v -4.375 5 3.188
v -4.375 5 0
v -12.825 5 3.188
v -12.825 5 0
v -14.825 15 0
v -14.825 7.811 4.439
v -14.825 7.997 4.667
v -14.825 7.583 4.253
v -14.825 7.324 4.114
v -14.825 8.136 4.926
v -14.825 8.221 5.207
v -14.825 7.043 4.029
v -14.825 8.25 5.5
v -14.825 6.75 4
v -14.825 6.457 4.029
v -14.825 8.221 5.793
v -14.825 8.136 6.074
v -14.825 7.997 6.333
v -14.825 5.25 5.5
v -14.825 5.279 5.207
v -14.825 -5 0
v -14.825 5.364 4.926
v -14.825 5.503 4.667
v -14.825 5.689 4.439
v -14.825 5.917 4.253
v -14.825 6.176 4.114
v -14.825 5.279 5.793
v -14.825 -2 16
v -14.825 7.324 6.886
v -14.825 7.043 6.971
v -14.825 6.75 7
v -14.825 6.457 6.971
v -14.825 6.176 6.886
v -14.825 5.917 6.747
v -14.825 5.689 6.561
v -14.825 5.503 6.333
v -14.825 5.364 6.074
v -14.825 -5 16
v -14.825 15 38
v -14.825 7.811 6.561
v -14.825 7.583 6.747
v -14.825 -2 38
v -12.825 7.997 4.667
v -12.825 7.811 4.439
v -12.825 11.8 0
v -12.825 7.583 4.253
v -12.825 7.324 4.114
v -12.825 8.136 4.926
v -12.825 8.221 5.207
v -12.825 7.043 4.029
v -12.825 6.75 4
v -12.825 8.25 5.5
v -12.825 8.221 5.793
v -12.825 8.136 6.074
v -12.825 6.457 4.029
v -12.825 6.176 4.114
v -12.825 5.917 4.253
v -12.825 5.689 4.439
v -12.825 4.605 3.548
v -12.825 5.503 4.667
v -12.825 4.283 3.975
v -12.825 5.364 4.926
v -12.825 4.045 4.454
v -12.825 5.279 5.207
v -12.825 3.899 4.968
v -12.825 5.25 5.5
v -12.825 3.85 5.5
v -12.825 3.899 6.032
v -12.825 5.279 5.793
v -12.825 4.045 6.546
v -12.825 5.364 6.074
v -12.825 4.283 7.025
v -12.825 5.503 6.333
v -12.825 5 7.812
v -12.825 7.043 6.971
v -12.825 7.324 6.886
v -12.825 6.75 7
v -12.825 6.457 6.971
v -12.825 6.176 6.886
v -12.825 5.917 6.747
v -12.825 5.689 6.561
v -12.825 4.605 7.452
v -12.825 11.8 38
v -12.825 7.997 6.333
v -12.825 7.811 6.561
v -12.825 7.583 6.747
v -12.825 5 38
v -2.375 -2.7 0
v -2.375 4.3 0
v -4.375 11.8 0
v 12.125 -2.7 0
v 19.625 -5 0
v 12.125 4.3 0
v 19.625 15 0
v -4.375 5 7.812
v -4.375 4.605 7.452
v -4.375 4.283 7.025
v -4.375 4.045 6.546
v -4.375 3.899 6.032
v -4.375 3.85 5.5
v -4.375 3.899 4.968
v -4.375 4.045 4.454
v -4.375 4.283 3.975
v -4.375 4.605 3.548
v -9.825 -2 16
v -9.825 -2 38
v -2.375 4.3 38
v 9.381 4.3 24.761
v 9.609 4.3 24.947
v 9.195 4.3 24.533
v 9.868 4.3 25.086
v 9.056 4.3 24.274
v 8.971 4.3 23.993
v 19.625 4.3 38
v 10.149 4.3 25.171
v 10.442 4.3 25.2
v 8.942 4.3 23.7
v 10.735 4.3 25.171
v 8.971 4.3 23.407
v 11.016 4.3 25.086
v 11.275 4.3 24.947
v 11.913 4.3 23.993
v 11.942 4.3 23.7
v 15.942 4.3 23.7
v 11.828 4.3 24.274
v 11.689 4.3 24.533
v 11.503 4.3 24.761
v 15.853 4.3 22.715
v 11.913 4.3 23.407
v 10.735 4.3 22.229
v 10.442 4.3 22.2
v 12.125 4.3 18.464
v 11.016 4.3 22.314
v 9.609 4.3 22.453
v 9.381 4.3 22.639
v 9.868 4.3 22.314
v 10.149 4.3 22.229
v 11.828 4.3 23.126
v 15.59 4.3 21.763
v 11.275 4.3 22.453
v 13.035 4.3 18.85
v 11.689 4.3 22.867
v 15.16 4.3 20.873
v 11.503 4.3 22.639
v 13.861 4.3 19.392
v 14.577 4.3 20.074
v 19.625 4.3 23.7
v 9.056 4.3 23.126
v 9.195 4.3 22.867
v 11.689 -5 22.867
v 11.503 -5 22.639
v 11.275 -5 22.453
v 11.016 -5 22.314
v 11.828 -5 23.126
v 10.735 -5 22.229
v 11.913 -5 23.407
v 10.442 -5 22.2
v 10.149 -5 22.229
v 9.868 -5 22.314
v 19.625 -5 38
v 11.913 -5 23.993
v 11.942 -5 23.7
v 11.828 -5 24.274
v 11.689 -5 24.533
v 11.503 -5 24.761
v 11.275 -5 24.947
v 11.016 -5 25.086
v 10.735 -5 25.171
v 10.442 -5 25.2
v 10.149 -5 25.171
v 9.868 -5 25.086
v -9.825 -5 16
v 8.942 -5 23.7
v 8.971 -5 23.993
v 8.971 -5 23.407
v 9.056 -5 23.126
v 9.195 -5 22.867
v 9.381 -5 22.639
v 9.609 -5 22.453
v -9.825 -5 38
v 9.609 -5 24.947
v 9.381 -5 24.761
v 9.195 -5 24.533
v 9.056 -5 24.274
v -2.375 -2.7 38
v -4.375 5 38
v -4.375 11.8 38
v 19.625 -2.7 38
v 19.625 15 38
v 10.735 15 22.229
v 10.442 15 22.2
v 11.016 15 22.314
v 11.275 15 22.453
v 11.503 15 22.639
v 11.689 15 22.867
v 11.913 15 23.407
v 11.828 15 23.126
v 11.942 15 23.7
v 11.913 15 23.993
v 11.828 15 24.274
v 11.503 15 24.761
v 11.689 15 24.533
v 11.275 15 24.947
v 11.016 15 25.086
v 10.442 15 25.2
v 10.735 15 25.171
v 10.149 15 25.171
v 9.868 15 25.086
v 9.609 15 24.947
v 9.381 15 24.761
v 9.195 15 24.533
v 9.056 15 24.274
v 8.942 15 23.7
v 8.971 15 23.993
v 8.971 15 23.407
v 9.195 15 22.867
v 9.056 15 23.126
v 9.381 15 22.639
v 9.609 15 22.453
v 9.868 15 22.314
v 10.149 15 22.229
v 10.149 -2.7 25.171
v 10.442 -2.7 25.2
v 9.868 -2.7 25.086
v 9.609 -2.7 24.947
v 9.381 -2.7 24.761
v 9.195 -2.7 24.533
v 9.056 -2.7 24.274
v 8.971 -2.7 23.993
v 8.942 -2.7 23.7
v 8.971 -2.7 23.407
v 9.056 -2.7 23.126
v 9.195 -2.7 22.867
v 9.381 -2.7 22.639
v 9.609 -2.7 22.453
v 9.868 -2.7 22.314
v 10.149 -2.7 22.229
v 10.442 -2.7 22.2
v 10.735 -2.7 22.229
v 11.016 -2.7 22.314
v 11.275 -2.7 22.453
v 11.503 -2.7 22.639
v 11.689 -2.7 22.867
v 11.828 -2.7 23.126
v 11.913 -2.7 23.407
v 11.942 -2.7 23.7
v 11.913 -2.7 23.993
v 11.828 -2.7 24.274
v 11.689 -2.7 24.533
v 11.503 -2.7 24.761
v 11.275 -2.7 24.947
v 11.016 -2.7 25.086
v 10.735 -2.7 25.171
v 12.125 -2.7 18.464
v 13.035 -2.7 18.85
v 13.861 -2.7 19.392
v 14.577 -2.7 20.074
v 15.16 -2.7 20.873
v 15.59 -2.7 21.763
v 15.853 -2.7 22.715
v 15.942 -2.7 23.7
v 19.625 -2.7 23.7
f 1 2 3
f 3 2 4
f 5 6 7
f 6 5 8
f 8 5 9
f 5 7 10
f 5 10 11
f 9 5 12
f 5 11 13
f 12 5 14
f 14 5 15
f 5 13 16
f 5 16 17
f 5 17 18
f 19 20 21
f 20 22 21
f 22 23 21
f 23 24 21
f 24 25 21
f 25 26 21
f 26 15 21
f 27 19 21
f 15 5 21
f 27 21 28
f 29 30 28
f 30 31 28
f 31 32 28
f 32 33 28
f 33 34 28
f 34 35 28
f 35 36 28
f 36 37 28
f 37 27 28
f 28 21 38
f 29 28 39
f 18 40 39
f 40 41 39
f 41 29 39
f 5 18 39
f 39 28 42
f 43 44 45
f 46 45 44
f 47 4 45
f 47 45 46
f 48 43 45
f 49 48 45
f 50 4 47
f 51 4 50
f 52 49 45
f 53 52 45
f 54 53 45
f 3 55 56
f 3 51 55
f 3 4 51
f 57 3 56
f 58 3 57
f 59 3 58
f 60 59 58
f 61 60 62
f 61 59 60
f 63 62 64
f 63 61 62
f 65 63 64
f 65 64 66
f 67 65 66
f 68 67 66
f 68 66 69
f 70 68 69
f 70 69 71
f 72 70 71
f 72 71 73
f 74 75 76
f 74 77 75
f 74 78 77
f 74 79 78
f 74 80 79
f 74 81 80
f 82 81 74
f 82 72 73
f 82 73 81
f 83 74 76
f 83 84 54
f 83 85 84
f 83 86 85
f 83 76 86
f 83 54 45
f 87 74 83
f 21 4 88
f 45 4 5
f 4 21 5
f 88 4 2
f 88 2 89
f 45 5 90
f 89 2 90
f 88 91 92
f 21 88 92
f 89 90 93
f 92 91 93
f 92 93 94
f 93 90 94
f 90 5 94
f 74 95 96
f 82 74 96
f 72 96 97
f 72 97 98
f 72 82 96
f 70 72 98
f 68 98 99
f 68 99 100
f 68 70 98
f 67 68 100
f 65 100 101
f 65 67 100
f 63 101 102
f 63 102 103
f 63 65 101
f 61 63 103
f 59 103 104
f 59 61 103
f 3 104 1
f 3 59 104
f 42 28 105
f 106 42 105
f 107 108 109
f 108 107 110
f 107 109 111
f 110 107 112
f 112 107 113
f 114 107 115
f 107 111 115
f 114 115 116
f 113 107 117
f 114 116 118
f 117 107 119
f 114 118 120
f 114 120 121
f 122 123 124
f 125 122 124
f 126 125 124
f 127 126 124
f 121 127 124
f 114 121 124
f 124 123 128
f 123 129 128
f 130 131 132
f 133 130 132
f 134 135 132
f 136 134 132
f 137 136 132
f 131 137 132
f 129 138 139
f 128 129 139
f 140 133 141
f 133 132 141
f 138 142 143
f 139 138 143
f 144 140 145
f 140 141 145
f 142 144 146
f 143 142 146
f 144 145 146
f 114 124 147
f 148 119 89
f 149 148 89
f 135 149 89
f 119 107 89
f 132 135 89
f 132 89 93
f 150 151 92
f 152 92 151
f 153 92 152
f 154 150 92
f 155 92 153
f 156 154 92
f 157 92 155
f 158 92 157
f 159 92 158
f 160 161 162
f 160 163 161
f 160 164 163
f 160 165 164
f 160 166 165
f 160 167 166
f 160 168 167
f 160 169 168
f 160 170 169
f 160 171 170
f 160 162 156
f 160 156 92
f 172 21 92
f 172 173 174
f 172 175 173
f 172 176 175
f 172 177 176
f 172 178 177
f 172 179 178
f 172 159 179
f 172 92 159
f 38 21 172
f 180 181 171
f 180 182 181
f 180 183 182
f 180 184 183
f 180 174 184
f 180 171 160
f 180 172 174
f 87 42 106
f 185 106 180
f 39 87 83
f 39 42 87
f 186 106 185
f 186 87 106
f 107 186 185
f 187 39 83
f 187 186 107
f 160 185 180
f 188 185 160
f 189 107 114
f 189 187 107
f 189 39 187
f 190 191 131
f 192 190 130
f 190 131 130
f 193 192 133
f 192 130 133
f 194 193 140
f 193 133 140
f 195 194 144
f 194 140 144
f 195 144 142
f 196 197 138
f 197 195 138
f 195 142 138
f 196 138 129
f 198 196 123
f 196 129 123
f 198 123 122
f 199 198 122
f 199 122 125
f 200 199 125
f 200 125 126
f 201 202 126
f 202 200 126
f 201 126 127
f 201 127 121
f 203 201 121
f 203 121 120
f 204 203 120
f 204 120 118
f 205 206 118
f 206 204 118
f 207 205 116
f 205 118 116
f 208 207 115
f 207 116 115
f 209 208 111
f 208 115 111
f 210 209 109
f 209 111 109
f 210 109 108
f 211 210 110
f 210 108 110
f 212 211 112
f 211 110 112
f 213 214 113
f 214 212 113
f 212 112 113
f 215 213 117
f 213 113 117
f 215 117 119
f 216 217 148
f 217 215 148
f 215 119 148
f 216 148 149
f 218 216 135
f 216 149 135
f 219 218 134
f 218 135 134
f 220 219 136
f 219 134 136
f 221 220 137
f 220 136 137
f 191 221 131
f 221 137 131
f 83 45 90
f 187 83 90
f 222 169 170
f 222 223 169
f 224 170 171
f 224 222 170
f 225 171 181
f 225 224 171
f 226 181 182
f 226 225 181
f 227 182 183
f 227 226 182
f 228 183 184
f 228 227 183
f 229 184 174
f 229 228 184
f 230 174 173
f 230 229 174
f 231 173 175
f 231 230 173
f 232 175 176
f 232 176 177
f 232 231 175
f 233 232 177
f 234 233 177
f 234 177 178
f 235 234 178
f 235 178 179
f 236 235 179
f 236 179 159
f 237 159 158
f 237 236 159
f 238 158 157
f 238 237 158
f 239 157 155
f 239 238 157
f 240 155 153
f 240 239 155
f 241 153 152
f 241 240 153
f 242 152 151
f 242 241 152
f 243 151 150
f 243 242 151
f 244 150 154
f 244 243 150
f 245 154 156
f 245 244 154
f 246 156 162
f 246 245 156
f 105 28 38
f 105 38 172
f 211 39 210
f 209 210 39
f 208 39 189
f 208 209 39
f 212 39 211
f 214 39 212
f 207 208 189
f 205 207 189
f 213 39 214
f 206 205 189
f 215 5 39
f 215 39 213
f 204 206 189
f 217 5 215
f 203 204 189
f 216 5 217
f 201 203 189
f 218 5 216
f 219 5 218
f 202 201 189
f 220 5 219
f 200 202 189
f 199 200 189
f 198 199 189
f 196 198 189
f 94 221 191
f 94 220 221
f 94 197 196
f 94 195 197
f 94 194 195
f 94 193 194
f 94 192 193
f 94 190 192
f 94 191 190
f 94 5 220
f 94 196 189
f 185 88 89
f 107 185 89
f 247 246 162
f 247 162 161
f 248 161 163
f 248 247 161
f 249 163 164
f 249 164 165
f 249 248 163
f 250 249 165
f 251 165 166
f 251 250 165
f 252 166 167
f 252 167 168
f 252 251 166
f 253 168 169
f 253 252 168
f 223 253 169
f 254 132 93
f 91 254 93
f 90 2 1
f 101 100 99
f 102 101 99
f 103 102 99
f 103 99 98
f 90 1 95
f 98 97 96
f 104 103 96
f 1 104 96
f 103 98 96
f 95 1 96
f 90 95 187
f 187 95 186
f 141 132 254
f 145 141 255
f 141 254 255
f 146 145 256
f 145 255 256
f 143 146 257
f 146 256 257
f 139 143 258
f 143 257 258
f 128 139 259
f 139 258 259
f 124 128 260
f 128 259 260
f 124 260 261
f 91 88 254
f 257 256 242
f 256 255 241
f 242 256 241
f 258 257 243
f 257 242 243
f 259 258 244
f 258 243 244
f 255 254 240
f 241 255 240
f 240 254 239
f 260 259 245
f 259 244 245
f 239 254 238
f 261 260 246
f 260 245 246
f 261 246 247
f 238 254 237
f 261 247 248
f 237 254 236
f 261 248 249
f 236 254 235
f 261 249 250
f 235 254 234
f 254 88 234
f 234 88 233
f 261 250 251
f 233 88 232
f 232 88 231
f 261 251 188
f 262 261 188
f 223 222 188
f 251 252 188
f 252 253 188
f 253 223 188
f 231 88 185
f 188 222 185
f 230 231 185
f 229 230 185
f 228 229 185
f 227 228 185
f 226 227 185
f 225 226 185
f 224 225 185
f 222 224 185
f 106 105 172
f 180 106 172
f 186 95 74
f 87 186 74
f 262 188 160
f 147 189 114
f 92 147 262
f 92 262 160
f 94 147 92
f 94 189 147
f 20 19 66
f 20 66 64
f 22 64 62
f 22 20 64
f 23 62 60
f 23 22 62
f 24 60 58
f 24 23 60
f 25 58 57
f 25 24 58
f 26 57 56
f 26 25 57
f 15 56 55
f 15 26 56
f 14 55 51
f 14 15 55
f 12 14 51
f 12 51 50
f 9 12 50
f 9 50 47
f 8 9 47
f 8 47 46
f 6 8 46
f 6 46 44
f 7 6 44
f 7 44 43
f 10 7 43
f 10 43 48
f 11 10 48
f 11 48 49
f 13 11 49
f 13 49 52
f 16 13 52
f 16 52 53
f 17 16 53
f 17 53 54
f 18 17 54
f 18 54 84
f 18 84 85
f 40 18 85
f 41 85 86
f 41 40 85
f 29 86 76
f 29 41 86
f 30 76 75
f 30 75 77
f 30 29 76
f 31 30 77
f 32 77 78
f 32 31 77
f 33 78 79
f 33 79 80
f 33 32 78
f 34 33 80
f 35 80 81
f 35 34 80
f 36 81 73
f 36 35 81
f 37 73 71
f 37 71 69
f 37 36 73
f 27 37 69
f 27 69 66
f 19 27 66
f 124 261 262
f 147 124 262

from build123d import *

# Parameters (mm, degrees)
SKETCH1_W                      = 19
SKETCH1_H                      = 10.7
BOSS_EXTRUDE1_DEPTH            = 38
SKETCH1_H_2                    = 2.3
BOSS_EXTRUDE1_2_DEPTH          = 38
SKETCH1_6_W                    = 12.45
SKETCH1_6_H                    = 3.2
BOSS_EXTRUDE6_DEPTH            = 38
BOSS_EXTRUDE7_DEPTH            = 16
SKETCH4_W                      = 38
SKETCH4_H                      = 2.3
SKETCH4_H_2                    = 10.7
BOSS_EXTRUDE8_DEPTH            = 3
CUT_EXTRUDE1_REACH             = 48.286
SKETCH6_R                      = 1.5
CUT_EXTRUDE1_DIRECTION_2_REACH = 48.286
BOSS_EXTRUDE10_REACH           = 45.922
SKETCH7_W                      = 2
SKETCH7_H                      = 38
BOSS_EXTRUDE11_REACH           = 46.087
SKETCH8_W                      = 7.5
SKETCH8_H                      = 38
CUT_EXTRUDE2_REACH             = 55.44
SKETCH9_R                      = 1.5
CUT_EXTRUDE3_START             = -2
SKETCH9_3_R                    = 2.9
SKETCH9_3_R_2                  = 1.5
CUT_EXTRUDE3_DEPTH             = 8.45
SKETCH6_3_R                    = 5.5
SKETCH6_3_R_2                  = 1.5
SKETCH6_3_W                    = 9.18298076
SKETCH6_3_H                    = 14.3
CUT_EXTRUDE4_DEPTH             = 7


with BuildPart() as part:
    # Sketch1 → Boss-Extrude1 (new body)
    with BuildSketch(Plane.XY):
        with Locations((7.125, 9.65)):
            Rectangle(SKETCH1_W, SKETCH1_H)
    extrude(amount=-BOSS_EXTRUDE1_DEPTH)



with BuildPart() as body_2:
    # Sketch1 → Boss-Extrude1 2 (new body)
    with BuildSketch(Plane.XY):
        with Locations((7.125, -3.85)):
            Rectangle(SKETCH1_W, SKETCH1_H_2)
    extrude(amount=-BOSS_EXTRUDE1_2_DEPTH)


with BuildPart() as part_1:
    add(part.part)

    add(body_2.part)  # Boss-Extrude6 merges body 2
    # Sketch1<6> → Boss-Extrude6 (add)
    with BuildSketch(Plane.XY):
        Polygon((-14.825, 5), (-14.825, -2), (-9.825, -2), (-9.825, -5), (-2.375, -5), (-2.375, 5), align=None)
        with Locations((-8.6, 13.4)):
            Rectangle(SKETCH1_6_W, SKETCH1_6_H)
    extrude(amount=-BOSS_EXTRUDE6_DEPTH)

    # Sketch1<7> → Boss-Extrude7 (add)
    with BuildSketch(Plane.XY):
        Polygon((-14.825, -2), (-14.825, -3.3), (-14.825, -5), (-9.825, -5), (-9.825, -2), align=None)
    extrude(amount=-BOSS_EXTRUDE7_DEPTH)

    # Sketch4 → Boss-Extrude8 (add)
    with BuildSketch(Plane(origin=(16.625, 0, 0), x_dir=(0, 0, -1), z_dir=(1, 0, 0))):
        with Locations((19, -3.85)):
            Rectangle(SKETCH4_W, SKETCH4_H)
        with Locations((19, 9.65)):
            Rectangle(SKETCH4_W, SKETCH4_H_2)
    extrude(amount=BOSS_EXTRUDE8_DEPTH)

    # Sketch6 → Cut-Extrude1 (cut, up to next)
    with BuildSketch(Plane(origin=(0, -2.7, 0), x_dir=(1, 0, 0), z_dir=(0, 1, 0)), mode=Mode.PRIVATE) as cut_extrude1_sk1:
        with Locations(Location((10.44201924, 23.7, 0), (0, 0, 270))):
            Circle(SKETCH6_R)
    cut_extrude1_tool1 = extrude(cut_extrude1_sk1.sketch, amount=-CUT_EXTRUDE1_REACH, mode=Mode.PRIVATE) & part_1.part
    # Sketch6 → Cut-Extrude1 (cut, up to next)
    with BuildSketch(Plane(origin=(0, -2.7, 0), x_dir=(1, 0, 0), z_dir=(0, 1, 0)), mode=Mode.PRIVATE) as cut_extrude1_sk2:
        with BuildLine():
            Line((10.44201924, 25.2), (10.44201924, 23.7))
            Line((10.44201924, 23.7), (11.94201924, 23.7))
            ThreePointArc((11.94201924, 23.7), (11.502679412, 24.760660172), (10.44201924, 25.2))
        make_face()
    cut_extrude1_tool2 = extrude(cut_extrude1_sk2.sketch, amount=-CUT_EXTRUDE1_REACH, mode=Mode.PRIVATE) & part_1.part
    # Sketch6 → Cut-Extrude1 (cut, up to next)
    with BuildSketch(Plane(origin=(0, -2.7, 0), x_dir=(1, 0, 0), z_dir=(0, 1, 0)), mode=Mode.PRIVATE) as cut_extrude1_sk3:
        with BuildLine():
            Line((11.94201924, 23.7), (10.44201924, 23.7))
            Line((10.44201924, 23.7), (10.44201924, 25.2))
            ThreePointArc((10.44201924, 25.2), (9.381359068, 22.639339828), (11.94201924, 23.7))
        make_face()
    cut_extrude1_tool3 = extrude(cut_extrude1_sk3.sketch, amount=-CUT_EXTRUDE1_REACH, mode=Mode.PRIVATE) & part_1.part
    add(cut_extrude1_tool1.solids().sort_by_distance((10.442019, -2.7, -23.7))[0], mode=Mode.SUBTRACT)
    add(cut_extrude1_tool2.solids().sort_by_distance((11.078639, -2.7, -24.33662))[0], mode=Mode.SUBTRACT)
    add(cut_extrude1_tool3.solids().sort_by_distance((10.229813, -2.7, -23.487793))[0], mode=Mode.SUBTRACT)

    # Cut-Extrude1 direction 2: up to this face of the body (flat: up to its plane)
    cut_extrude1_direction_2_end = Plane(part_1.part.faces().sort_by_distance((2.4, 15, -19))[0])
    # Sketch6 → Cut-Extrude1 direction 2 (cut, up to the picked face)
    with BuildSketch(Plane(origin=(0, -2.7, 0), x_dir=(1, 0, 0), z_dir=(0, 1, 0)), mode=Mode.PRIVATE) as cut_extrude1_direction_2_sk1:
        with Locations(Location((10.44201924, 23.7, 0), (0, 0, 270))):
            Circle(SKETCH6_R)
    cut_extrude1_direction_2_tool1 = split(extrude(cut_extrude1_direction_2_sk1.sketch, amount=CUT_EXTRUDE1_DIRECTION_2_REACH, mode=Mode.PRIVATE), bisect_by=cut_extrude1_direction_2_end, keep=Keep.BOTH, mode=Mode.PRIVATE)
    # Sketch6 → Cut-Extrude1 direction 2 (cut, up to the picked face)
    with BuildSketch(Plane(origin=(0, -2.7, 0), x_dir=(1, 0, 0), z_dir=(0, 1, 0)), mode=Mode.PRIVATE) as cut_extrude1_direction_2_sk2:
        with BuildLine():
            Line((10.44201924, 25.2), (10.44201924, 23.7))
            Line((10.44201924, 23.7), (11.94201924, 23.7))
            ThreePointArc((11.94201924, 23.7), (11.502679412, 24.760660172), (10.44201924, 25.2))
        make_face()
    cut_extrude1_direction_2_tool2 = split(extrude(cut_extrude1_direction_2_sk2.sketch, amount=CUT_EXTRUDE1_DIRECTION_2_REACH, mode=Mode.PRIVATE), bisect_by=cut_extrude1_direction_2_end, keep=Keep.BOTH, mode=Mode.PRIVATE)
    # Sketch6 → Cut-Extrude1 direction 2 (cut, up to the picked face)
    with BuildSketch(Plane(origin=(0, -2.7, 0), x_dir=(1, 0, 0), z_dir=(0, 1, 0)), mode=Mode.PRIVATE) as cut_extrude1_direction_2_sk3:
        with BuildLine():
            Line((11.94201924, 23.7), (10.44201924, 23.7))
            Line((10.44201924, 23.7), (10.44201924, 25.2))
            ThreePointArc((10.44201924, 25.2), (9.381359068, 22.639339828), (11.94201924, 23.7))
        make_face()
    cut_extrude1_direction_2_tool3 = split(extrude(cut_extrude1_direction_2_sk3.sketch, amount=CUT_EXTRUDE1_DIRECTION_2_REACH, mode=Mode.PRIVATE), bisect_by=cut_extrude1_direction_2_end, keep=Keep.BOTH, mode=Mode.PRIVATE)
    add(cut_extrude1_direction_2_tool1.solids().sort_by(Axis((10.442019, -2.7, -23.7), (0, 1, 0)))[0], mode=Mode.SUBTRACT)
    add(cut_extrude1_direction_2_tool2.solids().sort_by(Axis((11.078639, -2.7, -24.33662), (0, 1, 0)))[0], mode=Mode.SUBTRACT)
    add(cut_extrude1_direction_2_tool3.solids().sort_by(Axis((10.229813, -2.7, -23.487793), (0, 1, 0)))[0], mode=Mode.SUBTRACT)

    # Sketch7 → Boss-Extrude10 (add, up to next)
    with BuildSketch(Plane(origin=(0, 5, 0), x_dir=(1, 0, 0), z_dir=(0, 1, 0)), mode=Mode.PRIVATE) as boss_extrude10_sk1:
        with Locations((-3.375, 19)):
            Rectangle(SKETCH7_W, SKETCH7_H)
    boss_extrude10_tool1 = extrude(boss_extrude10_sk1.sketch, amount=BOSS_EXTRUDE10_REACH, mode=Mode.PRIVATE) - part_1.part
    # Sketch7 → Boss-Extrude10 (add, up to next)
    with BuildSketch(Plane(origin=(0, 5, 0), x_dir=(1, 0, 0), z_dir=(0, 1, 0)), mode=Mode.PRIVATE) as boss_extrude10_sk2:
        with Locations((-13.825, 19)):
            Rectangle(SKETCH7_W, SKETCH7_H)
    boss_extrude10_tool2 = extrude(boss_extrude10_sk2.sketch, amount=BOSS_EXTRUDE10_REACH, mode=Mode.PRIVATE) - part_1.part
    add(boss_extrude10_tool1.solids().sort_by_distance((-3.375, 5, -19))[0])
    add(boss_extrude10_tool2.solids().sort_by_distance((-13.825, 5, -19))[0])

    # Sketch8 → Boss-Extrude11 (add, up to next)
    with BuildSketch(Plane.XZ.offset(-4.3), mode=Mode.PRIVATE) as boss_extrude11_sk1:
        with Locations((15.875, -19)):
            Rectangle(SKETCH8_W, SKETCH8_H)
    boss_extrude11_tool1 = extrude(boss_extrude11_sk1.sketch, amount=BOSS_EXTRUDE11_REACH, mode=Mode.PRIVATE) - part_1.part
    add(boss_extrude11_tool1.solids().sort_by_distance((15.875, 4.3, -19))[0])

    # Sketch9 → Cut-Extrude2 (cut, up to next)
    with BuildSketch(Plane.ZY.offset(14.825), mode=Mode.PRIVATE) as cut_extrude2_sk1:
        with Locations(Location((-5.5, 6.75, 0), (0, 0, 270))):
            Circle(SKETCH9_R)
    cut_extrude2_tool1 = extrude(cut_extrude2_sk1.sketch, amount=-CUT_EXTRUDE2_REACH, mode=Mode.PRIVATE) & part_1.part
    add(cut_extrude2_tool1.solids().sort_by_distance((-14.825, 6.75, -5.5))[0], mode=Mode.SUBTRACT)

    # Sketch9<3> → Cut-Extrude3 (cut)
    with BuildSketch(Plane.ZY.offset(14.825).offset(CUT_EXTRUDE3_START)):
        with Locations((-5.5, 6.75)):
            Circle(SKETCH9_3_R)
        with Locations(Location((-5.5, 6.75, 0), (0, 0, 270))):
            Circle(SKETCH9_3_R_2, mode=Mode.SUBTRACT)
    extrude(amount=-CUT_EXTRUDE3_DEPTH, mode=Mode.SUBTRACT)

    # Sketch6<3> → Cut-Extrude4 (cut)
    with BuildSketch(Plane(origin=(0, -2.7, 0), x_dir=(1, 0, 0), z_dir=(0, 1, 0))):
        with Locations((10.44201924, 23.7)):
            Circle(SKETCH6_3_R)
        with Locations(Location((10.44201924, 23.7, 0), (0, 0, 270))):
            Circle(SKETCH6_3_R_2, mode=Mode.SUBTRACT)
        with Locations((15.03350962, 30.85)):
            Rectangle(SKETCH6_3_W, SKETCH6_3_H)
    extrude(amount=CUT_EXTRUDE4_DEPTH, mode=Mode.SUBTRACT)


with BuildPart() as body_2_2:
    # Mirror2: mirrored copy
    add(part_1.part.mirror(Plane.XY))


solid = body_2_2.part
